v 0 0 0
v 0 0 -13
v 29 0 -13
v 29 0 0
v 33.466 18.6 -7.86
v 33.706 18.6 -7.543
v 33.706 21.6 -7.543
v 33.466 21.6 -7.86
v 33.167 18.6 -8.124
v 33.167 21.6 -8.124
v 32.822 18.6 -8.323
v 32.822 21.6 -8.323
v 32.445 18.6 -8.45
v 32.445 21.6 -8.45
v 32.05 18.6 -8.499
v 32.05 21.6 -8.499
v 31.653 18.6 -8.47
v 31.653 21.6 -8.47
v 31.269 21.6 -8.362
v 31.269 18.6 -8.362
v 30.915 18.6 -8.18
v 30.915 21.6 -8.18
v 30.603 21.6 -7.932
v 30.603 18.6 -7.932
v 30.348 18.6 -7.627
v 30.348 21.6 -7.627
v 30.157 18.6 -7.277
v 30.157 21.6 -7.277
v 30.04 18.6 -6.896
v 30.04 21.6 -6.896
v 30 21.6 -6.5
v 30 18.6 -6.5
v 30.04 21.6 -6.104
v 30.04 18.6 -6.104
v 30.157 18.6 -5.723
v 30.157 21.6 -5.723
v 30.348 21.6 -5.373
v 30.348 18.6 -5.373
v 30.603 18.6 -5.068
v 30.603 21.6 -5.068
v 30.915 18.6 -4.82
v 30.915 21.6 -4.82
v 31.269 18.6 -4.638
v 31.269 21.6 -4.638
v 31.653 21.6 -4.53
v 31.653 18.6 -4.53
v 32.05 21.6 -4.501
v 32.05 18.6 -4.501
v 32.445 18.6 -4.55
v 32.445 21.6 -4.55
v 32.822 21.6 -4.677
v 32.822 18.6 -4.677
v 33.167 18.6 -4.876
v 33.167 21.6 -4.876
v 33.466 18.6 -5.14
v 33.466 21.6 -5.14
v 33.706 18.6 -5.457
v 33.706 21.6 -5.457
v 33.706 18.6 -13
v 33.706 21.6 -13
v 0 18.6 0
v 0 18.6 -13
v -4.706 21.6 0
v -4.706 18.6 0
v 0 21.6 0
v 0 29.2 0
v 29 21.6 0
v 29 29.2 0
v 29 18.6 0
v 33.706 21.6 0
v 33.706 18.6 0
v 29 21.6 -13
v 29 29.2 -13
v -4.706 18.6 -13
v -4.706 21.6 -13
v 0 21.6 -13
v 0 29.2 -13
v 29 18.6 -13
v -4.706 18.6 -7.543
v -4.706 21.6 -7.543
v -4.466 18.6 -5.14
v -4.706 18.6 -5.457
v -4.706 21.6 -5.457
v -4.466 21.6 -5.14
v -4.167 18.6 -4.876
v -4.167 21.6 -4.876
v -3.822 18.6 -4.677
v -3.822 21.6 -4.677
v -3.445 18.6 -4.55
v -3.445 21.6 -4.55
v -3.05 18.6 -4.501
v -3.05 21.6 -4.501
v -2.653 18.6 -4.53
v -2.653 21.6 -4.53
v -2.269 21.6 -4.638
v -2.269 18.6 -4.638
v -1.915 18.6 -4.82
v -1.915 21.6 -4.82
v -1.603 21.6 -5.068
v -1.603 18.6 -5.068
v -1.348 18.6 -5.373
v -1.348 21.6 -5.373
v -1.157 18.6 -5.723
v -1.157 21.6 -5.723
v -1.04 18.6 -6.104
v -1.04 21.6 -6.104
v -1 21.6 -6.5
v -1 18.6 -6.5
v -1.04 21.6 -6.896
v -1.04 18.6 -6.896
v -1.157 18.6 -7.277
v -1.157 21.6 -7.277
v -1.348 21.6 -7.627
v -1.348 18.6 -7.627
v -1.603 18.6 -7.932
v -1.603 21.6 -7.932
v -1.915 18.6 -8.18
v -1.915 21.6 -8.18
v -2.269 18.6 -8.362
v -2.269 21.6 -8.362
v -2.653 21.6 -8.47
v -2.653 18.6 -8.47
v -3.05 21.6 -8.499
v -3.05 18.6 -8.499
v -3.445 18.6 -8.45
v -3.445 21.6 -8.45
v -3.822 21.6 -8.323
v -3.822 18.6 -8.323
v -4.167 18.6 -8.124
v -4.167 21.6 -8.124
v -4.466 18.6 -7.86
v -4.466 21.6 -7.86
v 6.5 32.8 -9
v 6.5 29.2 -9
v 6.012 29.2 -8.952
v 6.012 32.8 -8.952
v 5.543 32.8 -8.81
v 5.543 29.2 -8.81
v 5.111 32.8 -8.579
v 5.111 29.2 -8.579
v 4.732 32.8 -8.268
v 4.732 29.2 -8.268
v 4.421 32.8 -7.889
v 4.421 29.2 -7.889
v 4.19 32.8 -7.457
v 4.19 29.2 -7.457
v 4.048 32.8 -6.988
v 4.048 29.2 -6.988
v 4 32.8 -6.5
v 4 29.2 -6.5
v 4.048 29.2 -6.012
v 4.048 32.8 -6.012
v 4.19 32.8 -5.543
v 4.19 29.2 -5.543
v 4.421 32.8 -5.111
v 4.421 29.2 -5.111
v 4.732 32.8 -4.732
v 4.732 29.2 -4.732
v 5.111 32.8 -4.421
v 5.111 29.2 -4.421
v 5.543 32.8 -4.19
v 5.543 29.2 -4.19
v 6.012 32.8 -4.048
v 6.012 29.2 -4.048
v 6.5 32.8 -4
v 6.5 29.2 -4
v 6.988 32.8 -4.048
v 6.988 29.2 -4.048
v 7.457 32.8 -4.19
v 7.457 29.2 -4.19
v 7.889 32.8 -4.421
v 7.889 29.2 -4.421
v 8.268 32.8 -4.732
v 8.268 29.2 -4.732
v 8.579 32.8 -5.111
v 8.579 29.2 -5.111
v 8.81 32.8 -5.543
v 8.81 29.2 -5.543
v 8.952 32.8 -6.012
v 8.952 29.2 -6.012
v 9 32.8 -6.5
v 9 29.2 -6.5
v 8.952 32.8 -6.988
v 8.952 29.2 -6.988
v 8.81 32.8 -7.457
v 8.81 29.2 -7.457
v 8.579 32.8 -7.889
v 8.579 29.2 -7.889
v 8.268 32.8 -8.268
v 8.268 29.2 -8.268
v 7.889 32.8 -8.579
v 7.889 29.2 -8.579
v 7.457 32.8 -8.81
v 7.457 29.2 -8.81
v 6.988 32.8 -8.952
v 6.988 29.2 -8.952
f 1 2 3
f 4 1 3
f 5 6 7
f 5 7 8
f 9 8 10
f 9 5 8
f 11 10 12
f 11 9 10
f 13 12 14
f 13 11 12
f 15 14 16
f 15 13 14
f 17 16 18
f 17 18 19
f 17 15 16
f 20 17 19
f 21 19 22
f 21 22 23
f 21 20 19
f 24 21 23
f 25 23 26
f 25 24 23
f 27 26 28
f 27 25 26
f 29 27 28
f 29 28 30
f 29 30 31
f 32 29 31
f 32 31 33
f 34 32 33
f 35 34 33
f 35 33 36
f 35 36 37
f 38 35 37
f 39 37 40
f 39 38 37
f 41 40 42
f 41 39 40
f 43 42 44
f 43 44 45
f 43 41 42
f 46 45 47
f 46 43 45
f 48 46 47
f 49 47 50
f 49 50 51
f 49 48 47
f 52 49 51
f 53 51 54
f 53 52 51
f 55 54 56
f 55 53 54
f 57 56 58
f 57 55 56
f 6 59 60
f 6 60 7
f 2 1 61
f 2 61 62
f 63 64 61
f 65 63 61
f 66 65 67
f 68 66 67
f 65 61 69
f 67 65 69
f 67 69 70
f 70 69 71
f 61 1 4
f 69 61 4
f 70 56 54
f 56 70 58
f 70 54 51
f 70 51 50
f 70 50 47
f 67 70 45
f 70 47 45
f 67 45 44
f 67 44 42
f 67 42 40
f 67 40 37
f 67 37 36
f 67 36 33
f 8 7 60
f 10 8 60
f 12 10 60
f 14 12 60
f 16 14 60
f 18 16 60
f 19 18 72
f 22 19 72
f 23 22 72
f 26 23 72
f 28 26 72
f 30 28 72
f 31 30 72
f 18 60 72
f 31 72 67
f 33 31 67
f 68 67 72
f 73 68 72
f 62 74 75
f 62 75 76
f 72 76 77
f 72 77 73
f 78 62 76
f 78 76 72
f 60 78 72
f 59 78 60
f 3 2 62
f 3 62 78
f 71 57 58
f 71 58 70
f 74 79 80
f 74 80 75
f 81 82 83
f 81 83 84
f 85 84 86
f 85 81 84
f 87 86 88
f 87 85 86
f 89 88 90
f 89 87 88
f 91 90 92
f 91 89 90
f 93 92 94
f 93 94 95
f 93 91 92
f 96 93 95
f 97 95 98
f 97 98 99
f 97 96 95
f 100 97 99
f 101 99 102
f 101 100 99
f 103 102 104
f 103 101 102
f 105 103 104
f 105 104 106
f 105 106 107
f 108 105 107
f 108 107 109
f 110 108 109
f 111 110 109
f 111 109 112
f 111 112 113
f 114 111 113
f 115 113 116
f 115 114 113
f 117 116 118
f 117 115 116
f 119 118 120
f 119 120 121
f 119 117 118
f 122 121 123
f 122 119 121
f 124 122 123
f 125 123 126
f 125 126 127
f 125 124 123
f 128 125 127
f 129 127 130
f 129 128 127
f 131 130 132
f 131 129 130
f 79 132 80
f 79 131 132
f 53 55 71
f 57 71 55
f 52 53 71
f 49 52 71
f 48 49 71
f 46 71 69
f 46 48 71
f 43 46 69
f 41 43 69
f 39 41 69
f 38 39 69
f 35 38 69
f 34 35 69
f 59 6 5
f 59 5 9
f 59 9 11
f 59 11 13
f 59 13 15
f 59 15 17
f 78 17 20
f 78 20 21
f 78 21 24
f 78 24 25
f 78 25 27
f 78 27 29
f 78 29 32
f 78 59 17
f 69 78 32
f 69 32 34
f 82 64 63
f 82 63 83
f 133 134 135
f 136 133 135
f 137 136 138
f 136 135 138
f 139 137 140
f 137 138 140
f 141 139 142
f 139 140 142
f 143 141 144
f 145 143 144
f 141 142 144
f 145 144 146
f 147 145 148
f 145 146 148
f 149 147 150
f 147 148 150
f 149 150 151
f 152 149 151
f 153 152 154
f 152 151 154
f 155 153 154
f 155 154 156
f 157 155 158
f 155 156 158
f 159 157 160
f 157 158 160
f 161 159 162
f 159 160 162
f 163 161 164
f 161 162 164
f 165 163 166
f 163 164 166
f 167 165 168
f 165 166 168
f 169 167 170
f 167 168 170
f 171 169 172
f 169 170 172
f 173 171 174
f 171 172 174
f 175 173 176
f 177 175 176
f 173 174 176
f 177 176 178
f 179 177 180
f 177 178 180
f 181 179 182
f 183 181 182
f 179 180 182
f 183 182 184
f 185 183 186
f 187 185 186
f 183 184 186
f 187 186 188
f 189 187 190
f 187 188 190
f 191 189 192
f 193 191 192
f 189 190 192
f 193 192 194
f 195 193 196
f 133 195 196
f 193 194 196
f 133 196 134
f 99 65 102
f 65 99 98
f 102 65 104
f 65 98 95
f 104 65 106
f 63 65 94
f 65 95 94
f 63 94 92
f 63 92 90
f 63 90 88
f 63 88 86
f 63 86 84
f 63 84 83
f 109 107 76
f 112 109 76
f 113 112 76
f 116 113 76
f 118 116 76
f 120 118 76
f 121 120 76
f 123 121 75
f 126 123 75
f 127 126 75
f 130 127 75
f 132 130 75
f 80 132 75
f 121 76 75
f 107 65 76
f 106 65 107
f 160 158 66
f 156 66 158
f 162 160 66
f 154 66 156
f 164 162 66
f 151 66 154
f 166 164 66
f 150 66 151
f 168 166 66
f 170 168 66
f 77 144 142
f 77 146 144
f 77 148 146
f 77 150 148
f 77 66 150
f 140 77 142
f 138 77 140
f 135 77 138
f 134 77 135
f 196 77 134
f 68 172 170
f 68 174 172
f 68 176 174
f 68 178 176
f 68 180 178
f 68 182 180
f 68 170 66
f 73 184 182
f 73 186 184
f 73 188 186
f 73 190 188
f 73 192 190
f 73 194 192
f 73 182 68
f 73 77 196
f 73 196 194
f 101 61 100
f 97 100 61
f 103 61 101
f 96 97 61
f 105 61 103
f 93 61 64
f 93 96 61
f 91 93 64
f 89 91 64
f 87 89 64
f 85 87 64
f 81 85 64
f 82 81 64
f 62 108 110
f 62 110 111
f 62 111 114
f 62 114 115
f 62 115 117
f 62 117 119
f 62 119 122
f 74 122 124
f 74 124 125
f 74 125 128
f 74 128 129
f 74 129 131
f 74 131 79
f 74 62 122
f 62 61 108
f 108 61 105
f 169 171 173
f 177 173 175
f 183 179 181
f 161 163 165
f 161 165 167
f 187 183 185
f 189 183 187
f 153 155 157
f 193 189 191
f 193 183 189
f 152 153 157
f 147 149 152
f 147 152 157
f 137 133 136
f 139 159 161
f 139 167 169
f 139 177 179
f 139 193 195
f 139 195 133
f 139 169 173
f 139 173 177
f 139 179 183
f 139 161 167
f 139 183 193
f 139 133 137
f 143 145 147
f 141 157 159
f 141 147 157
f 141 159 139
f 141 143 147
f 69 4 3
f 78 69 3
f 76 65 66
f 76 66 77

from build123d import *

# Parameters (mm, degrees)
SKETCH_1_W      = 29
SKETCH_1_H      = 13
EXTRUDE_2_DEPTH = 29.2
EXTRUDE_3_DEPTH = 3
SKETCH_3_R      = 2.5
EXTRUDE_4_DEPTH = 3.6


with BuildPart() as part:
    # 草图1 → 凸台-拉伸2 (new body)
    with BuildSketch(Plane(origin=(0, 0, 0), x_dir=(1, 0, 0), z_dir=(0, 1, 0))):
        with Locations((14.5, 6.5)):
            Rectangle(SKETCH_1_W, SKETCH_1_H)
    extrude(amount=EXTRUDE_2_DEPTH)

    # 草图2 → 凸台-拉伸3 (add)
    with BuildSketch(Plane(origin=(0, 18.6, 0), x_dir=(-1, 0, 0), z_dir=(0, -1, 0))):
        with BuildLine():
            Line((-29, 0), (-29, 13))
            Line((-29, 13), (-33.706494839, 13))
            Line((-33.706494839, 13), (-33.706494839, 7.543012639))
            ThreePointArc((-33.706494839, 7.543012639), (-30, 6.5), (-33.706494839, 5.456987361))
            Line((-33.706494839, 5.456987361), (-33.706494839, 0))
            Line((-33.706494839, 0), (-29, 0))
        make_face()
        with BuildLine():
            Line((4.706494839, 13), (0, 13))
            Line((0, 13), (0, 0))
            Line((0, 0), (4.706494839, 0))
            Line((4.706494839, 0), (4.706494839, 5.456987361))
            ThreePointArc((4.706494839, 5.456987361), (1, 6.5), (4.706494839, 7.543012639))
            Line((4.706494839, 7.543012639), (4.706494839, 13))
        make_face()
    extrude(amount=-EXTRUDE_3_DEPTH)

    # 草图3 → 凸台-拉伸4 (add)
    with BuildSketch(Plane(origin=(0, 29.2, 0), x_dir=(1, 0, 0), z_dir=(0, 1, 0))):
        with Locations(Location((6.5, 6.5, 0), (0, 0, 90))):
            Circle(SKETCH_3_R)
    extrude(amount=EXTRUDE_4_DEPTH)


solid = part.part
